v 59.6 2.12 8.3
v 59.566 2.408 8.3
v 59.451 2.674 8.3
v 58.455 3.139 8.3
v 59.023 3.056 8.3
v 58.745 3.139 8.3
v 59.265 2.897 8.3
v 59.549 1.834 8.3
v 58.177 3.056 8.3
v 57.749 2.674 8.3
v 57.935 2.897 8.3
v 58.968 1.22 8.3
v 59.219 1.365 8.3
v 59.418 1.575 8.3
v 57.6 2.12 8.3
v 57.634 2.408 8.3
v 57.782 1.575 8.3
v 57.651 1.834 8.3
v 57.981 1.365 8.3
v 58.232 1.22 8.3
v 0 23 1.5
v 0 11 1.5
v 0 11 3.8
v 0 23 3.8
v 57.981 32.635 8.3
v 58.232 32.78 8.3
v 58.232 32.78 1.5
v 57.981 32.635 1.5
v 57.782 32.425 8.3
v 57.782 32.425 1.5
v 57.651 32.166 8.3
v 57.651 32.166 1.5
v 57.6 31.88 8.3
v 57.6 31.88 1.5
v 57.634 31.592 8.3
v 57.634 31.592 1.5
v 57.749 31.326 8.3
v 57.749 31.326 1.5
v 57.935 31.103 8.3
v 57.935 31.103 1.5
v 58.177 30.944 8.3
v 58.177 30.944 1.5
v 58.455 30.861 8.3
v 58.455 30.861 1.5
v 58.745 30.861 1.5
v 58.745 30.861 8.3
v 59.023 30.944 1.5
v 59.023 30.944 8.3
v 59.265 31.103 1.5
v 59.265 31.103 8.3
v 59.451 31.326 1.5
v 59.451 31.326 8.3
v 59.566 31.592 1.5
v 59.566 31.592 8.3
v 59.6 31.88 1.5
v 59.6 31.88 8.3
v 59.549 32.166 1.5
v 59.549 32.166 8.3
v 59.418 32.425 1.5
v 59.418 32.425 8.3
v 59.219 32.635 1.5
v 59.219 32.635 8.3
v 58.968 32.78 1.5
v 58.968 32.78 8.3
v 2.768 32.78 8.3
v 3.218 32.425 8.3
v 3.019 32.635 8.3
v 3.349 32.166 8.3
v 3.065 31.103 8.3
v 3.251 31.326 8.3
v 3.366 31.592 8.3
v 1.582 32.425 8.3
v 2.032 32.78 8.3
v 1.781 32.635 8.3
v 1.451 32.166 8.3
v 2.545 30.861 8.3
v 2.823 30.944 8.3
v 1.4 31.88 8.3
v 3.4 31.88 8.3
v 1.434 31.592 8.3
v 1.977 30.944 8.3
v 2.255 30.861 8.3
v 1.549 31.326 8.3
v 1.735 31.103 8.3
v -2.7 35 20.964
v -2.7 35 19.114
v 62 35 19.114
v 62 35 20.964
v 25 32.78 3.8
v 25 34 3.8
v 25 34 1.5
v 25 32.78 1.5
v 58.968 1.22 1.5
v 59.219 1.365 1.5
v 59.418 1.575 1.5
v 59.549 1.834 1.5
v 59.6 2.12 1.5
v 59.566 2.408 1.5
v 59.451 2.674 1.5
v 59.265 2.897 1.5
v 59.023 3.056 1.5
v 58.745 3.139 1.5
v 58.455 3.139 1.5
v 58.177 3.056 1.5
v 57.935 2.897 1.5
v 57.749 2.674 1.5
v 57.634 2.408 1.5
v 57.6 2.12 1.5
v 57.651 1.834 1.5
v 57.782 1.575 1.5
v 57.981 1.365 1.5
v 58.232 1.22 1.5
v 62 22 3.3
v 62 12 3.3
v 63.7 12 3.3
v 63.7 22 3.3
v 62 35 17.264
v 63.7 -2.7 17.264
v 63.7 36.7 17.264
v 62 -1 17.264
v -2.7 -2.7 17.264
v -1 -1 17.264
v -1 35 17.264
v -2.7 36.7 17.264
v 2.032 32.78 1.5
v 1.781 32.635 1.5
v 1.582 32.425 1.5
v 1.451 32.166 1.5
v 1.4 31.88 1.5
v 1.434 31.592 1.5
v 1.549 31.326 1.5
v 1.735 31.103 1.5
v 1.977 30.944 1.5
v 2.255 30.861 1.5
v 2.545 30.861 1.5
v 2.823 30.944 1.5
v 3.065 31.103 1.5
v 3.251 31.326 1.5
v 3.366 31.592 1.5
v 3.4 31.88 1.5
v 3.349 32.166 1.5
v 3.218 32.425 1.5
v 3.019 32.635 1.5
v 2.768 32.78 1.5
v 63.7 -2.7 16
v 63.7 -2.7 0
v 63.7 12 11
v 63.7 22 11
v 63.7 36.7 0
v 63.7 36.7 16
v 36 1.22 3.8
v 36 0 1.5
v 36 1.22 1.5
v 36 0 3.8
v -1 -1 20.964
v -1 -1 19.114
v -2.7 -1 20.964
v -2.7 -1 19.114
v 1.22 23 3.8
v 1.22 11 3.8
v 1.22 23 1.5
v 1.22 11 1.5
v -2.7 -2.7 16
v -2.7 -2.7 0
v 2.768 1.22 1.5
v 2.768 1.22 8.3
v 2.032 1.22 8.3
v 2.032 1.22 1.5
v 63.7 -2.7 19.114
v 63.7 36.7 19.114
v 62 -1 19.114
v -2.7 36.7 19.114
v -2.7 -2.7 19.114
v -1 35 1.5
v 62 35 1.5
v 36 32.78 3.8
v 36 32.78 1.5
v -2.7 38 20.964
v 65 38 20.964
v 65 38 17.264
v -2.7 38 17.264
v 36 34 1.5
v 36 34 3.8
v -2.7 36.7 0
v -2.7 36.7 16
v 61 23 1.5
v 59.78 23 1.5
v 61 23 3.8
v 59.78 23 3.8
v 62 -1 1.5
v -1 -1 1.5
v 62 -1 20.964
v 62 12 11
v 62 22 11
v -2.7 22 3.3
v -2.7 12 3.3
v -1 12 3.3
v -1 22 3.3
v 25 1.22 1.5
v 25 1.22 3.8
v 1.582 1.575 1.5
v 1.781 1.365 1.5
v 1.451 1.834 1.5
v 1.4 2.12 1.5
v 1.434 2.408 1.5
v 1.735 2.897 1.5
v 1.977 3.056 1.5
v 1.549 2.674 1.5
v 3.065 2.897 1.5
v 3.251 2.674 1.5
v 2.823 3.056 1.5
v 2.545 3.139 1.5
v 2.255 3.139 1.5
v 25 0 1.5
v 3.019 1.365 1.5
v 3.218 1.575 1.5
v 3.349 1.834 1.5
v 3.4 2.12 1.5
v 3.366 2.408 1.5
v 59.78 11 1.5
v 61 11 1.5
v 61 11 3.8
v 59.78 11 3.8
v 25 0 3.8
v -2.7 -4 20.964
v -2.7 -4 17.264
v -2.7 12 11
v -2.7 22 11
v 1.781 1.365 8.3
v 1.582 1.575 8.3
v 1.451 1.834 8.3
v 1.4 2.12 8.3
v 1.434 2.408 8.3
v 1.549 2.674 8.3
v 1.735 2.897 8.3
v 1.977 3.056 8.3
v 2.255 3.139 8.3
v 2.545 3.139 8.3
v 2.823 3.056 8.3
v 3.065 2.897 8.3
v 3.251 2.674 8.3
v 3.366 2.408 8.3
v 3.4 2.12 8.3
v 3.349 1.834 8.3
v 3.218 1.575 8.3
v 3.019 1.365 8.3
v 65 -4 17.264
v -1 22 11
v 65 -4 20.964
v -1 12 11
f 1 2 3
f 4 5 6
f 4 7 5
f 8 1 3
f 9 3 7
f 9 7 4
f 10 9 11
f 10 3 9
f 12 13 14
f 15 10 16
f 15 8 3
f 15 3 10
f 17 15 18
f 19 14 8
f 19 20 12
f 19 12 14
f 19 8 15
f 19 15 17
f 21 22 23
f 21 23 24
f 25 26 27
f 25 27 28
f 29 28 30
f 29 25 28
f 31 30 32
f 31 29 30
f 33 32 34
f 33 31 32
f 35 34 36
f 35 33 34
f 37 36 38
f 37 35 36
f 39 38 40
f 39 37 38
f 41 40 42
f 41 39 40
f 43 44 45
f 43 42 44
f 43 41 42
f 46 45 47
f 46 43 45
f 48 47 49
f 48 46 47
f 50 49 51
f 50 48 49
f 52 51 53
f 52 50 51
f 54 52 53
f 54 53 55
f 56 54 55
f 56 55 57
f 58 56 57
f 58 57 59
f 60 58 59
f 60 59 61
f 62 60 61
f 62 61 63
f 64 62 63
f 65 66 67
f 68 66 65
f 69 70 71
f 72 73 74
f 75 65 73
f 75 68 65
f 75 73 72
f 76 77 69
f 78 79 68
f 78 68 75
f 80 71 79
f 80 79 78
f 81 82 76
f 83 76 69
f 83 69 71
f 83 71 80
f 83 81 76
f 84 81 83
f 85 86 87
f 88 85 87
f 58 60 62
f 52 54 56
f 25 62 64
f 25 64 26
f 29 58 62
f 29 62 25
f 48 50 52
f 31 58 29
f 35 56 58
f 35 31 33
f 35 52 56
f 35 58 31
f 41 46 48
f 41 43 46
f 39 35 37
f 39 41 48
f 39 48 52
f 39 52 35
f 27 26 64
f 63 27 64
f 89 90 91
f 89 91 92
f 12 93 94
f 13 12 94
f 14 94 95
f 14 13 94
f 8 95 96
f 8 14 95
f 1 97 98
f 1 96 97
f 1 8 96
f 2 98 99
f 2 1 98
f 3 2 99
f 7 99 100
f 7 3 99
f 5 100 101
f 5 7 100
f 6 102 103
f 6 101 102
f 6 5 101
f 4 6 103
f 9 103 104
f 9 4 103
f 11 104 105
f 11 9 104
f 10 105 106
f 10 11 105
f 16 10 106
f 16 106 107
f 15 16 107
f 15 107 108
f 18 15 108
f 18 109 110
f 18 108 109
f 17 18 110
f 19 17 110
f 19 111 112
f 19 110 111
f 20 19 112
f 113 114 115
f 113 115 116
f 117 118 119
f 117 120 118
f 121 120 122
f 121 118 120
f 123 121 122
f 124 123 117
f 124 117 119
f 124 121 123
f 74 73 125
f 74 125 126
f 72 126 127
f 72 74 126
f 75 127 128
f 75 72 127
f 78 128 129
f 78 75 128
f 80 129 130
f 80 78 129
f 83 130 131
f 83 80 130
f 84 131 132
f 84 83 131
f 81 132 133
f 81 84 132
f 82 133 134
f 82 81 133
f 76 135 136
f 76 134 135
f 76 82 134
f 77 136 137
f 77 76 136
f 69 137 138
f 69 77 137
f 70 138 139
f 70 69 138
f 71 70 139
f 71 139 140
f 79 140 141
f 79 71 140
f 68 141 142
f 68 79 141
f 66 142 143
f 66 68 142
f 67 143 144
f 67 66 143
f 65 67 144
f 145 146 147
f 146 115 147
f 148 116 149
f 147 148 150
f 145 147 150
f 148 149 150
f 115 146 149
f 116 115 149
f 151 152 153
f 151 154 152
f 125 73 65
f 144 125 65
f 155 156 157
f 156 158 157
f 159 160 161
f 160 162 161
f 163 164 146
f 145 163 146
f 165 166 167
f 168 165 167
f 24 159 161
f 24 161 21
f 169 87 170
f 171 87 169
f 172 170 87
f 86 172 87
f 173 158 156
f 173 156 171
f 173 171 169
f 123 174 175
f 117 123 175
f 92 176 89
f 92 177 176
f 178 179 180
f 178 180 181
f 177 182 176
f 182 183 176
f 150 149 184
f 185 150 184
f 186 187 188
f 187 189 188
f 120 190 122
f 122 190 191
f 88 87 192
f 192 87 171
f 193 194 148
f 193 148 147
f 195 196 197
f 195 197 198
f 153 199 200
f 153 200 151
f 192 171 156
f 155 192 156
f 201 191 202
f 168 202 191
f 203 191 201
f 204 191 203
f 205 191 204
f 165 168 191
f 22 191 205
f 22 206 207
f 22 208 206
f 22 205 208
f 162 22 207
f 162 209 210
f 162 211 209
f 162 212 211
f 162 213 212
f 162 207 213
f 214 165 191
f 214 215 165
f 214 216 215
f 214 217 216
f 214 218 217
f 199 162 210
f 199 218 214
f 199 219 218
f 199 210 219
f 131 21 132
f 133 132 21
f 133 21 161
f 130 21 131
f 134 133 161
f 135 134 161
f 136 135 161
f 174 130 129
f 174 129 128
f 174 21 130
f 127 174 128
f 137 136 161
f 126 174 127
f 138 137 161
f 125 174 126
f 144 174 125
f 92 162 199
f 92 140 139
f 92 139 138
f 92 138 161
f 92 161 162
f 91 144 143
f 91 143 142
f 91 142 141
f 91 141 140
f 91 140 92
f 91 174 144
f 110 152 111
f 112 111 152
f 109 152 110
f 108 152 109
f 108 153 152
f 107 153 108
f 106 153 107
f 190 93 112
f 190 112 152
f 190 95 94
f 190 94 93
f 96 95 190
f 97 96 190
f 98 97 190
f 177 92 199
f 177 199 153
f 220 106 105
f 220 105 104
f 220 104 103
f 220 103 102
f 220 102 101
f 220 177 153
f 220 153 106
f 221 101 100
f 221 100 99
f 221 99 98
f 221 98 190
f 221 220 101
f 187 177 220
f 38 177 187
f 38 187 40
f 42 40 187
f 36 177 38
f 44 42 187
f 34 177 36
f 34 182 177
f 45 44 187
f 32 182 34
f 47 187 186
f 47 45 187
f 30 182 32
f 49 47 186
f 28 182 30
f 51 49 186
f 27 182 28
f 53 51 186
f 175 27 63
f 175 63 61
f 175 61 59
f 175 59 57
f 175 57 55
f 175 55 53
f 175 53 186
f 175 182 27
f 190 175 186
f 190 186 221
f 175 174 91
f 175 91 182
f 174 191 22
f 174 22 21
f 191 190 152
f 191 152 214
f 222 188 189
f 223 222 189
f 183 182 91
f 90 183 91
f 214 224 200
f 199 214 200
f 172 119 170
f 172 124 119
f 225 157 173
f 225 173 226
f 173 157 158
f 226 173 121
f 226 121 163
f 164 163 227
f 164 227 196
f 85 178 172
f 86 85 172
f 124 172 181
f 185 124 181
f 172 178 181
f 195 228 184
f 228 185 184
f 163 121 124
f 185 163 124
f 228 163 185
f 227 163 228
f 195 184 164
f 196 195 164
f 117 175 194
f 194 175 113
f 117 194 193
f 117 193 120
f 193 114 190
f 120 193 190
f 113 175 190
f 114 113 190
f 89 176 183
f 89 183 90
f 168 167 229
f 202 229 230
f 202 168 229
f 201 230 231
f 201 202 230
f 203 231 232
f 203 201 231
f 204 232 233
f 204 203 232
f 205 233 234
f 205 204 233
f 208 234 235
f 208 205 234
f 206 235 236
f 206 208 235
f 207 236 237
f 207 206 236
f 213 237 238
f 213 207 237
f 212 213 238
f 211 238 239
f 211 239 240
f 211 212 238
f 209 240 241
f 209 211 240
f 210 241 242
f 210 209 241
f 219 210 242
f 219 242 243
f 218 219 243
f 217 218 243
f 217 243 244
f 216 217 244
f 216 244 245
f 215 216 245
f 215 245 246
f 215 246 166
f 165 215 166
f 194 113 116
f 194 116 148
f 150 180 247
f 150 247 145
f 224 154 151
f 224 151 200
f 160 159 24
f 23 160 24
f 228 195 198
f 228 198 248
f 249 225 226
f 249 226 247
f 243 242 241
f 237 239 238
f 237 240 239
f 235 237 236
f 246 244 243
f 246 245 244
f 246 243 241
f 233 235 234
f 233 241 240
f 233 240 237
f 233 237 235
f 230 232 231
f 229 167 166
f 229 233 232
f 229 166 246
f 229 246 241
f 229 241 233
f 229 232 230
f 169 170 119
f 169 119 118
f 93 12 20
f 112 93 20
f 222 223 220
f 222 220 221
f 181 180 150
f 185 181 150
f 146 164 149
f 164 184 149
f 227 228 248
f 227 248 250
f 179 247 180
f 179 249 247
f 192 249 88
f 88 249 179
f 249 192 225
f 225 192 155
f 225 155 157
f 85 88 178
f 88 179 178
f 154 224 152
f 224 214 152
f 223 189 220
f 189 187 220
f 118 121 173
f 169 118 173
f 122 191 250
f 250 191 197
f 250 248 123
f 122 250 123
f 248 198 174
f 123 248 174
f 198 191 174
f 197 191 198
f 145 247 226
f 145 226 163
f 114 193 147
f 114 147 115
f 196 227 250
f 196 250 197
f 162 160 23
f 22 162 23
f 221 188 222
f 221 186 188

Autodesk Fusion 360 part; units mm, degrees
sketch "Spodek" plane through (0, 0, 0) normal (0, 0, 1) x (1, 0, 0)
  line L0 (0, 0) -> (61, 0)
  line L1 (61, 0) -> (61, 34)
  line L2 (61, 34) -> (0, 34)
  line L3 (0, 34) -> (0, 0)
  line L4 (-1, 35) -> (62, 35)
  line L5 (62, 35) -> (62, -1)
  line L6 (62, -1) -> (-1, -1)
  line L7 (-1, -1) -> (-1, 35)
  line L8 (-2.7, -2.7) -> (-2.7, 36.7) construction
  line L9 (63.7, 36.7) -> (-2.7, 36.7) construction
  line L10 (63.7, -2.7) -> (63.7, 36.7) construction
  line L11 (63.7, -2.7) -> (-2.7, -2.7) construction
  line L12 (-2.7, -2.7) -> (63.7, -2.7)
  line L13 (63.7, -2.7) -> (63.7, 36.7)
  line L14 (63.7, 36.7) -> (-2.7, 36.7)
  line L15 (-2.7, 36.7) -> (-2.7, -2.7)
  dimension "d1" = 61
  dimension "d2" = 34
  dimension "d3" = 63
  dimension "d4" = 36
  dimension "d5" = 1.7
  dimension "d6" = 1.7
  dimension "d7" = 1.7
  dimension "d8" = 1.7
sketch "TotoNevim" plane through (0, 0, 0) normal (0, 0, 1) x (1, 0, 0)
extrude "Extrude1" add sketch "Spodek" along normal blind 12 contours L12 L13 L14 L15 makes body 1
extrude "Extrude2" add sketch "Spodek" along normal blind 1.5 contours L0 L1 L2 L3 | L4 L5 L6 L7 bodies 1
sketch "Sketch3" plane through (0, 0, 1.5) normal (0, 0, 1) x (-1, 0, 0)
  line L0 (1, 1) -> (-62, 1)
  line L1 (-62, 1) -> (-62, -35)
  line L2 (-62, -35) -> (1, -35)
  line L3 (1, -35) -> (1, 1)
  line L4 (-59.78, -32.78) -> (-1.22, -32.78)
  line L5 (-1.22, -32.78) -> (-1.22, -1.22)
  line L6 (-1.22, -1.22) -> (-59.78, -1.22)
  line L7 (-59.78, -1.22) -> (-59.78, -32.78)
  line L8 (-61, 0) -> (-61, -34)
  line L9 (0, 0) -> (-61, 0)
  line L10 (0, -34) -> (0, 0)
  line L11 (-61, -34) -> (0, -34)
  dimension "d13" = 1.22
  dimension "d14" = 1.22
  dimension "d15" = 1.22
  dimension "d16" = 1.22
extrude "Extrude3" add sketch "Sketch3" along normal blind 1.8 contours L8 L9 L10 L11 bodies 1
extrude "Extrude4" add 1 faces at (20, -2.1333, 12) along direction (0, 0, 1) blind 5.243 on bodies 1 bodies 1
extrude "Extrude5" add 1 faces at (20, -2.1333, 17.243) along direction (0, 0, 1) blind 0.021 on bodies 1 bodies 1
sketch "Prurez1" plane through (-2.7, 0, 0) normal (-1, 0, 0) x (0, -1, 0)
  line L0 (-36.7, 0) -> (2.7, 0)
  line L1 (2.7, 0) -> (2.7, 17.264)
  line L2 (2.7, 17.264) -> (-36.7, 17.264)
  line L3 (-36.7, 17.264) -> (-36.7, 0)
  line L4 (-12, 3.3) -> (-12, 11) construction
  line L5 (0, 1.5) -> (0, 3.3) construction
  line L6 (-22, 11) -> (-22, 3.3) construction
  line L7 (-34, 3.3) -> (-34, 11) construction
  line L8 (-35, 1.5) -> (-35, 17.264) construction
  line L9 (-22, 11) -> (-12, 11) construction
  line L10 (-12, 11) -> (-12, 3.3) construction
  line L11 (-12, 3.3) -> (-22, 3.3) construction
  line L12 (-22, 3.3) -> (-22, 11) construction
  line L13 (-22, 11) -> (-12, 11)
  line L14 (-12, 11) -> (-12, 3.3)
  line L15 (-12, 3.3) -> (-22, 3.3)
  line L16 (-22, 3.3) -> (-22, 11)
  dimension "d23" = 7.7
  dimension "d24" = 12
  dimension "d25" = 12
  dimension "d26" = 1
extrude "Extrude6" cut sketch "Prurez1" against normal up to surface (66.4 mm away) contours L13 L14 L15 L16 bodies 1
sketch "Sketch5" plane through (0, 0, 17.264) normal (0, 0, 1) x (-1, 0, 0)
  line L0 (-62, 1) -> (1, 1)
  line L1 (1, 1) -> (1, -35)
  line L2 (1, -35) -> (-62, -35)
  line L3 (-62, -35) -> (-62, 1)
  line L4 (2.7, -36.7) -> (2.7, 2.7)
  line L5 (2.7, 2.7) -> (-63.7, 2.7)
  line L6 (-63.7, 2.7) -> (-63.7, -36.7)
  line L7 (-63.7, -36.7) -> (2.7, -36.7)
  line L8 (2.7, -36.7) -> (-63.7, -36.7)
  line L9 (-63.7, -36.7) -> (-63.7, 2.7)
  line L10 (-63.7, 2.7) -> (2.7, 2.7)
  line L11 (2.7, 2.7) -> (2.7, -36.7)
  line L12 (1, -35) -> (-62, -35)
  line L13 (-62, -35) -> (-62, 1)
  line L14 (-62, 1) -> (1, 1)
  line L15 (1, 1) -> (1, -35)
extrude "Extrude7" add sketch "Sketch5" along normal blind 3.7 bodies 1
sketch "Sketch6" plane through (-2.7, 0, 0) normal (-1, 0, 0) x (0, -1, 0)
  line L0 (-22, 3.3) -> (-22, 11)
  line L1 (-22, 11) -> (-12, 11)
  line L2 (-12, 11) -> (-12, 3.3)
  line L3 (-12, 3.3) -> (-22, 3.3)
  line L4 (-36.7, 0) -> (2.7, 0)
  line L5 (2.7, 0) -> (2.7, 20.964)
  line L6 (2.7, 20.964) -> (-36.7, 20.964)
  line L7 (-36.7, 20.964) -> (-36.7, 0)
  line L8 (-35, 17.264) -> (1.0001, 17.264)
  line L9 (1.0001, 17.264) -> (1.0001, 20.964)
  line L10 (1.0001, 20.964) -> (-35, 20.964)
  line L11 (-35, 20.964) -> (-35, 17.264)
  line L12 (-36.7, 17.264) -> (2.7, 17.264)
extrude "Extrude8" cut sketch "Sketch6" against normal up to surface (64.7 mm away) contours L6 L8 L9 L10 L11 L12 bodies 1
sketch "BokFront" plane through (0, -2.7, 0) normal (0, -1, 0) x (1, 0, 0)
  line L0 (-2.7, 0) -> (63.7, 0)
  line L1 (63.7, 0) -> (63.7, 20.964)
  line L2 (63.7, 20.964) -> (-2.7, 20.964)
  line L3 (-2.7, 20.964) -> (-2.7, 0)
  line L4 (-2.7, 20.964) -> (63.7, 20.964)
  line L5 (63.7, 20.964) -> (63.7, 17.264)
  line L6 (63.7, 17.264) -> (-2.7, 17.264)
  line L7 (-2.7, 17.264) -> (-2.7, 20.964)
  point P0 (63.7, 17.264)
sketch "BokRight" plane through (63.7, 0, 0) normal (1, 0, 0) x (0, 1, 0)
  line L0 (22, 11) -> (22, 3.3)
  line L1 (22, 3.3) -> (12, 3.3)
  line L2 (12, 3.3) -> (12, 11)
  line L3 (12, 11) -> (22, 11)
  line L4 (-2.7, 0) -> (36.7, 0)
  line L5 (36.7, 0) -> (36.7, 20.964)
  line L6 (36.7, 20.964) -> (-2.7, 20.964)
  line L7 (-2.7, 20.964) -> (-2.7, 0)
  line L8 (-2.7, 20.964) -> (36.7, 20.964)
  line L9 (36.7, 20.964) -> (36.7, 17.264)
  line L10 (36.7, 17.264) -> (-2.7, 17.264)
  line L11 (-2.7, 17.264) -> (-2.7, 20.964)
  point P0 (36.7, 17.264)
sketch "BokBack" plane through (0, 36.7, 0) normal (0, 1, 0) x (-1, 0, 0)
  line L0 (-63.7, 0) -> (2.7, 0)
  line L1 (2.7, 0) -> (2.7, 20.964)
  line L2 (2.7, 20.964) -> (-63.7, 20.964)
  line L3 (-63.7, 20.964) -> (-63.7, 0)
  line L4 (-63.7, 20.964) -> (2.7, 20.964)
  line L5 (2.7, 20.964) -> (2.7, 17.264)
  line L6 (2.7, 17.264) -> (-63.7, 17.264)
  line L7 (-63.7, 17.264) -> (-63.7, 20.964)
  point P0 (2.7, 17.264)
extrude "Extrude9" add sketch "BokBack" along normal blind 1.3 contours L1 L2 L3 L4 L5 L6 L7 bodies 1
extrude "Extrude10" add sketch "BokFront" along normal blind 1.3 contours L1 L2 L3 L4 L5 L6 L7 bodies 1
extrude "Extrude11" add sketch "BokRight" along normal blind 1.3 contours L5 L6 L7 L8 L9 L10 L11 bodies 1
extrude "Extrude12" add 1 faces at (63.7, 37.5667, 19.7307) along direction (1, 0, 0) blind 1.3 on bodies 1 bodies 1
extrude "Extrude13" add 1 faces at (63.7, -3.1333, 19.7307) along direction (1, 0, 0) blind 1.3 on bodies 1 bodies 1
sketch "Sketch10" plane through (-2.7, 0, 0) normal (-1, 0, 0) x (0, -1, 0)
  line L0 (-35, 17.264) -> (-35, 20.964)
  line L1 (-35, 20.964) -> (-38, 20.964)
  line L2 (-38, 20.964) -> (-38, 17.264)
  line L3 (-38, 17.264) -> (-36.7, 17.264)
  line L4 (-36.7, 17.264) -> (-36.7, 0)
  line L5 (-36.7, 0) -> (2.7, 0)
  line L6 (2.7, 0) -> (2.7, 17.264)
  line L7 (2.7, 17.264) -> (4, 17.264)
  line L8 (4, 17.264) -> (4, 20.964)
  line L9 (4, 20.964) -> (1.0001, 20.964)
  line L10 (1.0001, 20.964) -> (1.0001, 17.264)
  line L11 (1.0001, 17.264) -> (-35, 17.264)
  line L12 (-22, 3.3) -> (-22, 11)
  line L13 (-22, 11) -> (-12, 11)
  line L14 (-12, 11) -> (-12, 3.3)
  line L15 (-12, 3.3) -> (-22, 3.3)
  line L16 (4, 17.264) -> (2.7, 16)
  line L17 (-38, 17.264) -> (-36.7, 16)
extrude "Extrude14" add sketch "Sketch10" against normal up to surface (67.7 mm away) contours L3 L4 L17 | L6 L7 L16 bodies 1
sketch "Sketch11" plane through (0, -2.7, 0) normal (0, 1, 0) x (-1, 0, 0)
  line L0 (-63.7, 16) -> (-63.7, 17.264)
  line L1 (-63.7, 17.264) -> (-65, 17.264)
  line L2 (-65, 17.264) -> (-65, 16)
  line L3 (-65, 16) -> (-63.7, 16)
  line L4 (-65, 17.264) -> (-63.7, 16)
extrude "Extrude15" add sketch "Sketch11" along normal blind 39.4 contours L0 L1 L4 bodies 1
extrude "Extrude16" cut 1 faces at (64.5667, -2.7, 16.4213) along direction (0, -1, 0) blind 5.3 on bodies 1 bodies 1
extrude "Extrude17" cut 1 faces at (64.5667, 36.7, 16.4213) along direction (0, 1, 0) blind 1.9 on bodies 1 bodies 1
sketch "Sketch12" plane through (-2.7, 35.85, 19.114) normal (-1, 0, 0) x (0, -1, 0)
  line L0 (-0.85, 0) -> (0.85, 0)
  line L1 (0.85, 0) -> (0.85, -1.85)
  line L2 (0.85, -1.85) -> (-0.85, -1.85)
  line L3 (-0.85, -1.85) -> (-0.85, 0)
  line L4 (-0.85, 1.85) -> (-0.85, -19.114)
  line L5 (36.8501, -1.85) -> (38.55, -1.85)
  line L6 (38.55, -1.85) -> (38.55, 0)
  line L7 (38.55, 0) -> (36.8501, 0)
  line L8 (36.8501, 0) -> (36.8501, -1.85)
  line L9 (38.55, -19.114) -> (38.55, 1.85)
  point P0 (0.85, -1.85)
  point P1 (36.8501, -1.85)
extrude "Extrude18" cut sketch "Sketch12" against normal blind 64.7 bodies 1
sketch "Sketch13" plane through (62, 0, 0) normal (-1, 0, 0) x (0, -1, 0)
  line L0 (-35, 17.264) -> (-35, 1.5)
  line L1 (-35, 1.5) -> (1, 1.5)
  line L2 (1, 1.5) -> (1, 17.264)
  line L3 (1.0001, 17.264) -> (2.7, 17.264)
  line L4 (2.7, 17.264) -> (2.7, 19.114)
  line L5 (2.7, 19.114) -> (1.0001, 19.114)
  line L6 (1, 19.114) -> (1, 20.964)
  line L7 (1, 20.964) -> (-35, 20.964)
  line L8 (-35, 20.964) -> (-35, 19.114)
  line L9 (-35, 19.114) -> (-36.7, 19.114)
  line L10 (-36.7, 19.114) -> (-36.7, 17.264)
  line L11 (-36.7, 17.264) -> (-35, 17.264)
  line L12 (-22, 3.3) -> (-22, 11)
  line L13 (-22, 11) -> (-12, 11)
  line L14 (-12, 11) -> (-12, 3.3)
  line L15 (-12, 3.3) -> (-22, 3.3)
  line L16 (-36.7, 19.114) -> (2.7, 19.114)
  line L17 (2.7, 19.114) -> (2.7, 17.264)
  line L18 (2.7, 17.264) -> (-36.7, 17.264)
  line L19 (-36.7, 17.264) -> (-36.7, 19.114)
extrude "Extrude19" cut sketch "Sketch13" against normal blind 1.7 contours L3 L4 L5 L9 L10 L11 L16 L17 L18 L19 bodies 1
sketch "Sketch14" plane through (0, 0, 3.3) normal (0, 0, 1) x (-1, 0, 0)
  line L0 (0, -34) -> (0, 0)
  line L1 (0, 0) -> (-61, 0)
  line L2 (-61, 0) -> (-61, -34)
  line L3 (-61, -34) -> (0, -34)
  line L4 (-1.22, -1.22) -> (-1.22, -32.78)
  line L5 (-1.22, -32.78) -> (-59.78, -32.78)
  line L6 (-59.78, -32.78) -> (-59.78, -1.22)
  line L7 (-59.78, -1.22) -> (-1.22, -1.22)
  circle A0 centre (-58.6, -31.85) radius 1
  line L8 (-61, -17) -> (0, -17) construction
  circle A1 centre (-58.6, -2.15) radius 1
  line L9 (-30.5, -34) -> (-30.5, 0) construction
  circle A2 centre (-2.4, -31.85) radius 1
  circle A3 centre (-2.4, -2.15) radius 1
  point P0 (-58.6, -31.85)
  dimension "d55" = 2.15
  dimension "d56" = 2.4
  dimension "d57" = 2
extrude "Extrude20" add sketch "Sketch14" along normal blind 5 separate body contours L7 A3 | L5 A2 | L7 A1 | L5 A0 picked at (-2.6077, -1.9583) picked at (-2.278, -32.1598) picked at (-58.2997, -2.1959) picked at (-58.3551, -31.7867) makes body 2 at (59.2633, 32.5983, 6.6333) makes body 3 at (59.1416, 2.9907, 6.6333) makes body 4 at (3.0633, 32.5983, 6.6333) makes body 5 at (2.8103, 3.062, 6.6333)
extrude "Extrude21" add 4 faces at (2.6077, 1.9583, 3.3) (2.278, 32.1598, 3.3) (58.3551, 31.7867, 3.3) (58.2997, 2.1959, 3.3) along direction (0, 0, -1) blind 2 on bodies 2 3 4 5 bodies 5 1 2 3 4
extrude "Extrude22" add 1 faces at (39.7441, 0.4067, 3.3) along direction (0, 0, 1) blind 0.5 on bodies 5 bodies 5
sketch "Sketch15" plane through (0, 0, 3.8) normal (0, 0, 1) x (-1, 0, 0)
  line L0 (0, -34) -> (0, 0)
  line L1 (0, 0) -> (-61, 0)
  line L2 (-61, 0) -> (-61, -34)
  line L3 (-61, -34) -> (0, -34)
  line L4 (-1.22, -1.22) -> (-1.22, -32.78)
  line L5 (-1.22, -32.78) -> (-2.0324, -32.78)
  line L6 (-2.0324, -32.78) -> (-2.7676, -32.78)
  line L7 (-2.7676, -32.78) -> (-58.2324, -32.78)
  line L8 (-58.2324, -32.78) -> (-58.9676, -32.78)
  line L9 (-58.9676, -32.78) -> (-59.78, -32.78)
  line L10 (-59.78, -32.78) -> (-59.78, -1.22)
  line L11 (-59.78, -1.22) -> (-58.9676, -1.22)
  line L12 (-58.9676, -1.22) -> (-58.2324, -1.22)
  line L13 (-58.2324, -1.22) -> (-2.7676, -1.22)
  line L14 (-2.7676, -1.22) -> (-2.0324, -1.22)
  line L15 (-2.0324, -1.22) -> (-1.22, -1.22)
  line L16 (0, -34) -> (-1.22, -34)
  line L17 (-1.22, -34) -> (-1.22, -23)
  line L18 (-1.22, -23) -> (0, -23)
  line L19 (0, -23) -> (0, -34)
  line L20 (0, 0) -> (-1.22, 0)
  line L21 (-1.22, 0) -> (-1.22, -11)
  line L22 (-1.22, -11) -> (0, -11)
  line L23 (0, -11) -> (0, 0)
  line L24 (0, 0) -> (-25, 0)
  line L25 (-25, 0) -> (-25, -1.22)
  line L26 (-25, -1.22) -> (0, -1.22)
  line L27 (0, -1.22) -> (0, 0)
  line L28 (-61, 0) -> (-36, 0)
  line L29 (-36, 0) -> (-36, -1.22)
  line L30 (-36, -1.22) -> (-61, -1.22)
  line L31 (-61, -1.22) -> (-61, 0)
  line L32 (-61, 0) -> (-59.78, 0)
  line L33 (-59.78, 0) -> (-59.78, -11)
  line L34 (-59.78, -11) -> (-61, -11)
  line L35 (-61, -11) -> (-61, 0)
  line L36 (-61, -34) -> (-59.78, -34)
  line L37 (-59.78, -34) -> (-59.78, -23)
  line L38 (-59.78, -23) -> (-61, -23)
  line L39 (-61, -23) -> (-61, -34)
  line L40 (0, -34) -> (-25, -34)
  line L41 (-25, -34) -> (-25, -32.78)
  line L42 (-25, -32.78) -> (0, -32.78)
  line L43 (0, -32.78) -> (0, -34)
  line L44 (-61, -34) -> (-36, -34)
  line L45 (-36, -34) -> (-36, -32.78)
  line L46 (-36, -32.78) -> (-61, -32.78)
  line L47 (-61, -32.78) -> (-61, -34)
  dimension "d64" = 11
  dimension "d65" = 11
  dimension "d66" = 25
  dimension "d67" = 25
  dimension "d68" = 11
  dimension "d69" = 11
  dimension "d70" = 25
  dimension "d71" = 25
extrude "Extrude23" cut sketch "Sketch15" against normal blind 2.3 contours L0 L3 L16 L17 L19 L40 L42 L43 | L3 L5 L6 L7 L17 L40 L41 L42 bodies 5
extrude "Extrude24" cut sketch "Sketch15" against normal blind 2.3 contours L3 L7 L8 L9 L37 L44 L45 L46 | L2 L3 L36 L37 L39 L44 L46 L47 bodies 5
extrude "Extrude25" cut sketch "Sketch15" against normal blind 2.3 contours L2 L10 L37 L38 L39 L46 bodies 5
extrude "Extrude26" cut sketch "Sketch15" against normal blind 2.3 contours L0 L4 L21 L22 L23 L26 | L0 L1 L20 L21 L23 L24 L26 L27 | L1 L13 L14 L15 L21 L24 L25 L26 | L2 L10 L30 L33 L34 L35 | L1 L11 L12 L13 L28 L29 L30 L33 | L1 L2 L28 L30 L31 L32 L33 L35 bodies 5
extrude "Extrude27" cut sketch "Sketch15" against normal blind 2.3 contours L0 L4 L17 L18 L19 L42 bodies 5
equation "d19 = 14 mm - 8.757 mm"
equation "d21 = 14 mm - 13.979 mm"
equation "d33 = 3 mm - 1.70 mm"
equation "d35 = 3 mm - 1.70 mm"
equation "d37 = 3 mm - 1.70 mm"
